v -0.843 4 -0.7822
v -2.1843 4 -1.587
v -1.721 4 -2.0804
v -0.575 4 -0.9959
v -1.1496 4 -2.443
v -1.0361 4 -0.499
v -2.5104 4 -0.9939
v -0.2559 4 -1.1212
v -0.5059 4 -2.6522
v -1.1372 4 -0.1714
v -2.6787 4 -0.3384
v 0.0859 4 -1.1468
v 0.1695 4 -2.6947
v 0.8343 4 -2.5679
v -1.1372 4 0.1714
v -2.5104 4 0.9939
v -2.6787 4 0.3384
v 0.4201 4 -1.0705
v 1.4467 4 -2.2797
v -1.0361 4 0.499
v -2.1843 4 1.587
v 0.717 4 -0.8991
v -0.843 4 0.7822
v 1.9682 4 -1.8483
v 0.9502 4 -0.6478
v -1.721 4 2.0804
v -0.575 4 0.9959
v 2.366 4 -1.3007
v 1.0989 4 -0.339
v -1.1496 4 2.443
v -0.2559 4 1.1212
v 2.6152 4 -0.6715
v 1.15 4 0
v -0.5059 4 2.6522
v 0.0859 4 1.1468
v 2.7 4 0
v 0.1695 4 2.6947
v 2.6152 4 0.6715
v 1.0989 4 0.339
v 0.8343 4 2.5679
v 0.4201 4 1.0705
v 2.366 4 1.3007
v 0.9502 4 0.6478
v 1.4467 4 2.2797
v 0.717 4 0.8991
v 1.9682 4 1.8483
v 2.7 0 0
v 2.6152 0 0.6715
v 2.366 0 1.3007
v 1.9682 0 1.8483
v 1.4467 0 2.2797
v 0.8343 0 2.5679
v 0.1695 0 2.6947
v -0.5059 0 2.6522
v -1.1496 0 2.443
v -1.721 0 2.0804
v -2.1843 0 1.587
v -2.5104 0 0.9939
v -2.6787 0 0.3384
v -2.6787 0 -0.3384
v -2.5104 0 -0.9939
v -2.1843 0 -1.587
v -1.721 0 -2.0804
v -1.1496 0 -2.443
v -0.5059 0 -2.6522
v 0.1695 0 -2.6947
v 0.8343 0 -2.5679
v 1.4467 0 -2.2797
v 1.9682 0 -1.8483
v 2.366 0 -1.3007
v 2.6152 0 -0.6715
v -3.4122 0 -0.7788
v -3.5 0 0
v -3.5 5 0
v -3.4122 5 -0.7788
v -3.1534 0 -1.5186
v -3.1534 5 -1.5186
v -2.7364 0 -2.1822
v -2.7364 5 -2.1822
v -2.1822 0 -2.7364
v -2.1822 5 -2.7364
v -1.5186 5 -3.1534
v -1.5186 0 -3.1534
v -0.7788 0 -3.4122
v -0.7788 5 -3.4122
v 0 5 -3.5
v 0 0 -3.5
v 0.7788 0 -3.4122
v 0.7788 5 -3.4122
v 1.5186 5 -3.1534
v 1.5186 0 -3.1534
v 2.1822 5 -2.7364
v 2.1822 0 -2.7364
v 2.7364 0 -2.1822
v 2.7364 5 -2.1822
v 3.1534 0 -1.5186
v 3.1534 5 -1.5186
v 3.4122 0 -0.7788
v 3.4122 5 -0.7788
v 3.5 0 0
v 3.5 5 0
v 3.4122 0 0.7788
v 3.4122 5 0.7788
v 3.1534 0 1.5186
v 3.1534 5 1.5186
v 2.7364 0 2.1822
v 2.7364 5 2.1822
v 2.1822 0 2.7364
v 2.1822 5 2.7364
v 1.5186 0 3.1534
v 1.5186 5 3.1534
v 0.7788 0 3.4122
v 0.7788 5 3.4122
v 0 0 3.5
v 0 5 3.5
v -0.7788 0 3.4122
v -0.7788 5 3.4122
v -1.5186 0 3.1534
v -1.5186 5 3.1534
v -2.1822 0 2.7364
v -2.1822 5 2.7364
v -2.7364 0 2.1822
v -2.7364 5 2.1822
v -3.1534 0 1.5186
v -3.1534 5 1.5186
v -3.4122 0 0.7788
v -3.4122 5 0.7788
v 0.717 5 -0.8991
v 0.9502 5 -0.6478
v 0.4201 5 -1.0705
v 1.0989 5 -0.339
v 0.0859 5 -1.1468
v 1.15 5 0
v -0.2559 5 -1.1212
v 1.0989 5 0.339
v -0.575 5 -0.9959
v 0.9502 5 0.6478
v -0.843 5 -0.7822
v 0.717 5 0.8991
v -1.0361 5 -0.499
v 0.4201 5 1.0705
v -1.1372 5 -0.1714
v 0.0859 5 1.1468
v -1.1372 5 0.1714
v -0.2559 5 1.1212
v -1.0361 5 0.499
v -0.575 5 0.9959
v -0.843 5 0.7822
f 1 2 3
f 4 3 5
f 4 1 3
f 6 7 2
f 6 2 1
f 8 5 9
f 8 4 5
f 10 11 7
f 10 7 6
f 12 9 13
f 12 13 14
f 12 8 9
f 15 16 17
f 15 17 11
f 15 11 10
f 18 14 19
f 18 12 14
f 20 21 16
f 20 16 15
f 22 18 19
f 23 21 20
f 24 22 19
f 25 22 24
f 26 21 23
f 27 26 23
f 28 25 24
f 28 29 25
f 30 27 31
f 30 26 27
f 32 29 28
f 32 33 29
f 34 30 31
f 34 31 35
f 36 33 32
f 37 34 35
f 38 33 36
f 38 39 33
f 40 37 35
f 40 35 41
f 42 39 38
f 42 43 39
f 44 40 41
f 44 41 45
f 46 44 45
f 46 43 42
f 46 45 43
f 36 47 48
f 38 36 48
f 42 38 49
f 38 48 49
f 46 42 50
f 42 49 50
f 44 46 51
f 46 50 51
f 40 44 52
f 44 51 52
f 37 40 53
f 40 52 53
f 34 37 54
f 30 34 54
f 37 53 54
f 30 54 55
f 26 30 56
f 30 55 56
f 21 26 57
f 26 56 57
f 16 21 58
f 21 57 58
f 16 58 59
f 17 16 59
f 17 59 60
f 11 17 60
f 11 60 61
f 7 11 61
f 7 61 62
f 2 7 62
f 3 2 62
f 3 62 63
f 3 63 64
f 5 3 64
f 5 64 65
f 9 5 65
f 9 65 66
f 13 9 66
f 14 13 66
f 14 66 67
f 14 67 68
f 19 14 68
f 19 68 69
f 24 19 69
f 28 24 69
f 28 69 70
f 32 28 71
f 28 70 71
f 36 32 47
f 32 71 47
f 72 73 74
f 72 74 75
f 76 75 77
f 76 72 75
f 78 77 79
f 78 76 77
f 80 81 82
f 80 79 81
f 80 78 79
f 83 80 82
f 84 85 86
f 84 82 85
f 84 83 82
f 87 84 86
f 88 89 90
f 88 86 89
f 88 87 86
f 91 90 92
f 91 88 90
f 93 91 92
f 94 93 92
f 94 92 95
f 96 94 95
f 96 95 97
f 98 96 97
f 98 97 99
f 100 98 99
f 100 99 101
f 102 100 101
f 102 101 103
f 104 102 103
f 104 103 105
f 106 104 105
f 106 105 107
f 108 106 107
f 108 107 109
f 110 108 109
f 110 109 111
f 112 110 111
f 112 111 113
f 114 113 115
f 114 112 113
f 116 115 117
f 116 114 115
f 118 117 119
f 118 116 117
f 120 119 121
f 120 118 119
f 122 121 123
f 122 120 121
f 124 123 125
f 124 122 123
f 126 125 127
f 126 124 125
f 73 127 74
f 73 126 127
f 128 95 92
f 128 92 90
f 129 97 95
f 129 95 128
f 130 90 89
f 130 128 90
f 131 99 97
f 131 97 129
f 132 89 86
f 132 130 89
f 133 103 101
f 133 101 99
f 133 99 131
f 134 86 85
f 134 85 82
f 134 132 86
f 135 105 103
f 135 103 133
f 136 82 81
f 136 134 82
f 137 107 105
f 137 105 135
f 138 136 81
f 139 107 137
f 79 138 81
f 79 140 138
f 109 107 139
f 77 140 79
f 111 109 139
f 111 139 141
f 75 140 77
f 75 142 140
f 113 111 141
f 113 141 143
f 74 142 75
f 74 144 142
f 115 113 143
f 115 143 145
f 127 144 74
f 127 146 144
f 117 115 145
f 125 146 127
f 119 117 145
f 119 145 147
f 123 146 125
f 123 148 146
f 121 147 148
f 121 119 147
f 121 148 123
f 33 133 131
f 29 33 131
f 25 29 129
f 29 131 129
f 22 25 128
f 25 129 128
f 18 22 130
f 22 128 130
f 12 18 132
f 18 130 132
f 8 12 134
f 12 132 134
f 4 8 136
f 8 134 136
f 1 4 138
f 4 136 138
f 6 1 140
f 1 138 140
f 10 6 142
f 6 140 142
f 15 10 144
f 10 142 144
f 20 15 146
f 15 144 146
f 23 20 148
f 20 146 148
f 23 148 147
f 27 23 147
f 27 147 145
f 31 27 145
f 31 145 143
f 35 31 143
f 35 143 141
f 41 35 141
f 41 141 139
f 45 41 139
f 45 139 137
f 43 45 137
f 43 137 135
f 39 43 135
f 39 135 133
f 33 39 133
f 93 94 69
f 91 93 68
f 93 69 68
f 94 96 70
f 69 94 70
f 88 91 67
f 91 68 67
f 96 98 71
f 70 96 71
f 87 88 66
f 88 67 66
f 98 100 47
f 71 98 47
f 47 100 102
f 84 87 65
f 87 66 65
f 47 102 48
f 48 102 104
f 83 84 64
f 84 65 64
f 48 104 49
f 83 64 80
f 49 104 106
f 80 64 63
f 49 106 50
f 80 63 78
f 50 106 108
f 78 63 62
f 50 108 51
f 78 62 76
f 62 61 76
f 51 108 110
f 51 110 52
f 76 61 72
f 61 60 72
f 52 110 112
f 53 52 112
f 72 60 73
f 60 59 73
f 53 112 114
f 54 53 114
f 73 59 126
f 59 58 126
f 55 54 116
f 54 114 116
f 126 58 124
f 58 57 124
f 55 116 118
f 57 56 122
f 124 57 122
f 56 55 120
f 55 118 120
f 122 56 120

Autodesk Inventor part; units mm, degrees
ref_plane "YZ Plane" through (0, 0, 0) normal (1, 0, 0) x (0, 1, 0)
ref_plane "XZ Plane" through (0, 0, 0) normal (0, 1, 0) x (-1, 0, 0)
ref_plane "XY Plane" through (0, 0, 0) normal (0, 0, 1) x (1, 0, 0)
sketch "Sketch1" plane through (0, 0, 0) normal (0, 1, 0) x (-1, 0, 0)
  circle A0 centre (0, 0) radius 3.5
  dimension "d0" = 7
extrude "Extrusion1" add sketch "Sketch1" along normal blind 5
sketch "Sketch3" plane through (0, 0, 0) normal (0, -1, 0) x (1, 0, 0)
  circle A0 centre (0, 0) radius 2.7
  circle A1 centre (0, 0) radius 3.5 projected
  dimension "d6" = 0.8
extrude "Extrusion3" cut sketch "Sketch3" against normal blind 4 contours A0
sketch "Sketch4" plane through (0, 5, 0) normal (0, 1, 0) x (1, 0, 0)
  circle A0 centre (0, 0) radius 2.7 projected
  circle A1 centre (0, 0) radius 1.15
  dimension "d9" = 2.3
extrude "Extrusion4" cut sketch "Sketch4" against normal through all contours A1
properties part number "shaft endcap"
